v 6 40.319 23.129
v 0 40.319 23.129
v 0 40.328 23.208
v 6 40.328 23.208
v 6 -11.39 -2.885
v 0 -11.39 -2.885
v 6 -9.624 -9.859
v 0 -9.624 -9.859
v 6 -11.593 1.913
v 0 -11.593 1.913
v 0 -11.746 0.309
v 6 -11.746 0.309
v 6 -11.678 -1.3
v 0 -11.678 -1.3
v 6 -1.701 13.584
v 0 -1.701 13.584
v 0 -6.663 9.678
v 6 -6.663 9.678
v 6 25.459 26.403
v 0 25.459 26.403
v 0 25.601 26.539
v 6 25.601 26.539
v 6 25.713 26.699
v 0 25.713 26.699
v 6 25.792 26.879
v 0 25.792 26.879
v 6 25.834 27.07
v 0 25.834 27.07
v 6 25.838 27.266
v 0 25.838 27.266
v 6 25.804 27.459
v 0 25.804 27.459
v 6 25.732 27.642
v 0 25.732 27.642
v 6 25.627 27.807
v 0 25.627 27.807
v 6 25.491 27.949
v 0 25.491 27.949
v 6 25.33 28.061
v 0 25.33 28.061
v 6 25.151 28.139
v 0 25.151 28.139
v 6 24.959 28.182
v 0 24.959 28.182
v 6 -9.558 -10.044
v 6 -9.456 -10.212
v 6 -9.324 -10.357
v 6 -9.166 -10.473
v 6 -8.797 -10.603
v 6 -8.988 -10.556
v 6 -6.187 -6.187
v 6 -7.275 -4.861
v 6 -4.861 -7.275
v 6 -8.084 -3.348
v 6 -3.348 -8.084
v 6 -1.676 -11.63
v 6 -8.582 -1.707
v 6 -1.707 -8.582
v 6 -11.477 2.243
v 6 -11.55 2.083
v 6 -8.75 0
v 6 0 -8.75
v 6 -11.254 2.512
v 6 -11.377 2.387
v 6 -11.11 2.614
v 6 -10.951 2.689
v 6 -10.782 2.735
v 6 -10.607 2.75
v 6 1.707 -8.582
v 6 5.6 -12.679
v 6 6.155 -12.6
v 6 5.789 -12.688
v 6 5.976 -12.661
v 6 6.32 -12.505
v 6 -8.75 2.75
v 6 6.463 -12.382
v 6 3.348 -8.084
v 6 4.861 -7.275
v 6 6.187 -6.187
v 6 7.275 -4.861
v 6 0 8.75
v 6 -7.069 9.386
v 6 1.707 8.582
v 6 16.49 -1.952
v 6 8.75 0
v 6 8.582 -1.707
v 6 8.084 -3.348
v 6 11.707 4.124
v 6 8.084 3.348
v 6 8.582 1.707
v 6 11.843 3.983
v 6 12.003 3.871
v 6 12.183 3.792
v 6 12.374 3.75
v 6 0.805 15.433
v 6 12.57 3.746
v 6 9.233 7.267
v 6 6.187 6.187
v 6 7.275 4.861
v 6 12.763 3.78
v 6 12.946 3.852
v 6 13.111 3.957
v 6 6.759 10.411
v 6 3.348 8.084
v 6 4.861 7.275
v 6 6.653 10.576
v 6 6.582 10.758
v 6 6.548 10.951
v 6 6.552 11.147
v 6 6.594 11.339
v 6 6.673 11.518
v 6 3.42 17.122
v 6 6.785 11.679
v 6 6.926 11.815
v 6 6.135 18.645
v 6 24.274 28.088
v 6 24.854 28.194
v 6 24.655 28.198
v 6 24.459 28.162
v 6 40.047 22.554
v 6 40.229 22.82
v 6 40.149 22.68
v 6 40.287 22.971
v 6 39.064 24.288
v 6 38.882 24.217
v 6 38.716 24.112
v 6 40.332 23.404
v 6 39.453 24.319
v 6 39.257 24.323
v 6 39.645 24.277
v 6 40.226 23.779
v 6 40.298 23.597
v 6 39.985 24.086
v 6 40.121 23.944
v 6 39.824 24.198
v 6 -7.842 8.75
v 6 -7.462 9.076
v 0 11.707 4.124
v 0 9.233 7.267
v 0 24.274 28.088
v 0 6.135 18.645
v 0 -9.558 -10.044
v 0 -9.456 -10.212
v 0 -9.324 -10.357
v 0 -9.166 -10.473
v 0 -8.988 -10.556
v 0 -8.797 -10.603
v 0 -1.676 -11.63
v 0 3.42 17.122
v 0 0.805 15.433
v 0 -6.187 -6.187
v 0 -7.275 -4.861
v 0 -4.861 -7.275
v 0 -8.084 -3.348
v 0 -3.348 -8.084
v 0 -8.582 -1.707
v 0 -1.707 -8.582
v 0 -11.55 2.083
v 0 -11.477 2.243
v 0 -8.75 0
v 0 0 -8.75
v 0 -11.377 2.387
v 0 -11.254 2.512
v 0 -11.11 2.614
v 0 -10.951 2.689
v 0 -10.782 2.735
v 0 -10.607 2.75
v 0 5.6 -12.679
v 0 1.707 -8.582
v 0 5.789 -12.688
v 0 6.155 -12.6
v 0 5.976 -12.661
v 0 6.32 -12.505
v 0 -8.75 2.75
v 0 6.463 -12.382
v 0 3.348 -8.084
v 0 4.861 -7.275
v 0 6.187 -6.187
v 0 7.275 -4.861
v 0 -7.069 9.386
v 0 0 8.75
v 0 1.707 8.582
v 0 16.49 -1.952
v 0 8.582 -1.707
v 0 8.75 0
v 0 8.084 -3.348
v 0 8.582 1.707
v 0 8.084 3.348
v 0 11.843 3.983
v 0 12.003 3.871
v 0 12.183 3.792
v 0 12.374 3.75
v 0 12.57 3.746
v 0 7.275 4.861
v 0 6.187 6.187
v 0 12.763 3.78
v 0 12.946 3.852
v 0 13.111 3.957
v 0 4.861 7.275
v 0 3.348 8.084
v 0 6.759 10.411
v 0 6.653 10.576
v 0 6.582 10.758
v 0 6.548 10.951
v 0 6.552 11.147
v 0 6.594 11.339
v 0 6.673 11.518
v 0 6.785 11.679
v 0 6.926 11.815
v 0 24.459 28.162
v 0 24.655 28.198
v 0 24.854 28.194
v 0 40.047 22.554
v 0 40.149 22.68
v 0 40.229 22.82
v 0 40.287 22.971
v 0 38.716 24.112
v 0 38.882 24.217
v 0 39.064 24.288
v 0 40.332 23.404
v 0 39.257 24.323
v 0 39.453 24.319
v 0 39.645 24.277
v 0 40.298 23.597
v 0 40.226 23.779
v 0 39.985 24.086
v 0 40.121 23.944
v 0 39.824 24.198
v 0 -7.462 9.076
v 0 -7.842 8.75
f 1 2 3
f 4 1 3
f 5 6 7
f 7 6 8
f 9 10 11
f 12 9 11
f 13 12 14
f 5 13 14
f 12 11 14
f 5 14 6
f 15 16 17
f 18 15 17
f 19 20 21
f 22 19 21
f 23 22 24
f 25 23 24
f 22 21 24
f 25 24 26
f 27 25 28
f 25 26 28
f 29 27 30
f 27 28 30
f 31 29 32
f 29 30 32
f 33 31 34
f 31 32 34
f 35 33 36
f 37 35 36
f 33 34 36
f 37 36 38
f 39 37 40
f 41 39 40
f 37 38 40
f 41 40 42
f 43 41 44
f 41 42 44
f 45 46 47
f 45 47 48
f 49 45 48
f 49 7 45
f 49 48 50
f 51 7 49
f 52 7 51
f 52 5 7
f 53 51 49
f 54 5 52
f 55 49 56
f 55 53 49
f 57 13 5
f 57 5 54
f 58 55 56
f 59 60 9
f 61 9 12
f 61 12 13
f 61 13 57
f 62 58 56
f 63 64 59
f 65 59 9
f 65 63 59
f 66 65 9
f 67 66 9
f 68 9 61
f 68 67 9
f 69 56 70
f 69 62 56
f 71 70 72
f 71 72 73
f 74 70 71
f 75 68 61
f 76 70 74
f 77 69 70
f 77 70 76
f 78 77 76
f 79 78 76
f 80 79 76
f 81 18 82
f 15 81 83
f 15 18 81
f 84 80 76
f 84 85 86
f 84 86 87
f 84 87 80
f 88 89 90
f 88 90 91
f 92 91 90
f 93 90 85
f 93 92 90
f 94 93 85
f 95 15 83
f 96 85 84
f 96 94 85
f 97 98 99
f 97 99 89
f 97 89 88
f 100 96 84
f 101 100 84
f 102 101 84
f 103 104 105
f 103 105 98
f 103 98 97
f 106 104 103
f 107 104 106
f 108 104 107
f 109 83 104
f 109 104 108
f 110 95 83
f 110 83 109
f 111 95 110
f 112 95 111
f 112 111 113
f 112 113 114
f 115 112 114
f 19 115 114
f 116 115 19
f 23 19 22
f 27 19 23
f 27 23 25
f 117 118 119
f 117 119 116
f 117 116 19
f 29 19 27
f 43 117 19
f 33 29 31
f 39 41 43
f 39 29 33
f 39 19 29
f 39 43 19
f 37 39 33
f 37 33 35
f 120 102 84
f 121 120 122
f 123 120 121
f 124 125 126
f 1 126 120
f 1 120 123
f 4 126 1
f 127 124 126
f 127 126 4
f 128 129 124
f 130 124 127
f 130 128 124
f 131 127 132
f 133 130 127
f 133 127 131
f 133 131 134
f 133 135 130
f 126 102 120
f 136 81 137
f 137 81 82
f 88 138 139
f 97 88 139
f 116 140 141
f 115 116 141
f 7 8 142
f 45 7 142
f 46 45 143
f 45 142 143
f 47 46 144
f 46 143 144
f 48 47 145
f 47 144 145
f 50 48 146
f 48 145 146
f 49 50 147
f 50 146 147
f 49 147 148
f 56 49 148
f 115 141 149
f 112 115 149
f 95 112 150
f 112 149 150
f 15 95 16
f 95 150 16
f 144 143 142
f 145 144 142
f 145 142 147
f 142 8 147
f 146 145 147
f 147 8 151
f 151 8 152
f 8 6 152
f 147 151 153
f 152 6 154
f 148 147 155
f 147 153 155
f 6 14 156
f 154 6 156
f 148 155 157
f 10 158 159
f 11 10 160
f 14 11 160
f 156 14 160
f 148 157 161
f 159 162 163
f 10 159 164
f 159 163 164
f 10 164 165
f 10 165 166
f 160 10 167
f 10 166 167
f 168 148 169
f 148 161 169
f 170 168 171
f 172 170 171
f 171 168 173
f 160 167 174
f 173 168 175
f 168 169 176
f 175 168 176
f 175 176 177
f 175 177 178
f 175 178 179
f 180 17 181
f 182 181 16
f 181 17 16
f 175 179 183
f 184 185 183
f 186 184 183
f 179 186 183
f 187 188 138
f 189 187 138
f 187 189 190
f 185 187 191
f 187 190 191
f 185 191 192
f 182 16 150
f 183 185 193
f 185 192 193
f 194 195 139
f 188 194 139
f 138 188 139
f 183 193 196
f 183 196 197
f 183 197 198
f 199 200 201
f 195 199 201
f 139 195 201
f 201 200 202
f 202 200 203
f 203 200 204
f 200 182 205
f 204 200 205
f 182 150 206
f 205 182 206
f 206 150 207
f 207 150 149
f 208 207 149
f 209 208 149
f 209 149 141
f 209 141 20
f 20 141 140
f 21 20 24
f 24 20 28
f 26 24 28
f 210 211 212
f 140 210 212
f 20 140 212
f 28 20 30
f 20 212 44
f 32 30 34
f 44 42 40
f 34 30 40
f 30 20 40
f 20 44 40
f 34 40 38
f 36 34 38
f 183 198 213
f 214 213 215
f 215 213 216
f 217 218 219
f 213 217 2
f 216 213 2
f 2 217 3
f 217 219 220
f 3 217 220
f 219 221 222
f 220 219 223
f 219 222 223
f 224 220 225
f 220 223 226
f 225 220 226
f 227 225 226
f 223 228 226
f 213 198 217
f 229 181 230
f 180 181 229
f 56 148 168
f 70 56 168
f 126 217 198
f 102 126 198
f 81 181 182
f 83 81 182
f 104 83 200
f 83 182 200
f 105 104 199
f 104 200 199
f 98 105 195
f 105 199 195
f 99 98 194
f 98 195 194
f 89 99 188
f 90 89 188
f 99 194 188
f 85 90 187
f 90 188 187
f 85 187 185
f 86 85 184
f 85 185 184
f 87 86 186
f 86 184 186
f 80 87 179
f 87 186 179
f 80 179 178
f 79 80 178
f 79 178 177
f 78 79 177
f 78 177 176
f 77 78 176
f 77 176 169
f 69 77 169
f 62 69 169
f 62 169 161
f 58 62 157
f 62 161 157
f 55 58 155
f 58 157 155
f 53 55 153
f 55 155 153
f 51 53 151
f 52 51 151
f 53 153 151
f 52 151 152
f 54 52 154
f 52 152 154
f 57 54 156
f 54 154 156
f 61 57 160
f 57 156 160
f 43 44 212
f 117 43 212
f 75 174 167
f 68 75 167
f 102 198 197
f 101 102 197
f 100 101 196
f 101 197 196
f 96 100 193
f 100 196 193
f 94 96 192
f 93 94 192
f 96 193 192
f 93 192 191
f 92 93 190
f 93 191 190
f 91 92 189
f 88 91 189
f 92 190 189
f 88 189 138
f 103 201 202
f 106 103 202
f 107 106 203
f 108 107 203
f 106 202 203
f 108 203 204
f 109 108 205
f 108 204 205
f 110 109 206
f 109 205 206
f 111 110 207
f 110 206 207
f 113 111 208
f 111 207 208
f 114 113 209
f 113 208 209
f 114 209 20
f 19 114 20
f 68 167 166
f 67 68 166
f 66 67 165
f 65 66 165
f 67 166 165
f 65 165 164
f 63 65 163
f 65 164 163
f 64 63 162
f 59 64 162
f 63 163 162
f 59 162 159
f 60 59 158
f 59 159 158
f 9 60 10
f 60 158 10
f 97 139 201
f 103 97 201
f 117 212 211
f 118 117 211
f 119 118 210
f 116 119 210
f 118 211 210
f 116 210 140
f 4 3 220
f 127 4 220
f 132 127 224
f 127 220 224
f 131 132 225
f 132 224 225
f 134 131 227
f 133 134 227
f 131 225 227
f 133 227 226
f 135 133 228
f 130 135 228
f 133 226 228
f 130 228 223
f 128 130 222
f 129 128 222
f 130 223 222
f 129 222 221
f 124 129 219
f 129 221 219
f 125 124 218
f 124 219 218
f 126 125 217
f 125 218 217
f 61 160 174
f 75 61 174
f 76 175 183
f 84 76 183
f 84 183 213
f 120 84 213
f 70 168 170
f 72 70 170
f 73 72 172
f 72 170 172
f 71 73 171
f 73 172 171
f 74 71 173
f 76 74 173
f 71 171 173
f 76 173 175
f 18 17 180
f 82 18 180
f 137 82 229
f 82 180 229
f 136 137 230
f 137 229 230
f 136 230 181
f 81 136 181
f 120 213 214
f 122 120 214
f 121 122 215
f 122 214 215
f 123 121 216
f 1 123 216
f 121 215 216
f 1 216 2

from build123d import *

# Parameters (mm, degrees)
F1_DEPTH = 6


with BuildPart() as f1:
    # F0 (on Right) → F1 (new body)
    with BuildSketch(Plane.YZ):
        with BuildLine():
            ThreePointArc((0, 8.75), (6.187184, -6.187184), (-8.75, 0))
            Line((-8.75, 0), (-8.75, 2.75))
            Line((-8.75, 2.75), (-10.606602, 2.75))
            ThreePointArc((-10.606602, 2.75), (-11.253598, 2.512493), (-11.593262, 1.912791))
            ThreePointArc((-11.593262, 1.912791), (-11.739513, -0.496329), (-11.39044, -2.884507))
            Line((-11.39044, -2.884507), (-9.624207, -9.859066))
            ThreePointArc((-9.624207, -9.859066), (-9.323883, -10.35677), (-8.797476, -10.603346))
            Line((-8.797476, -10.603346), (-1.676351, -11.629804))
            Line((-1.676351, -11.629804), (5.599694, -12.678593))
            ThreePointArc((5.599694, -12.678593), (6.067344, -12.634542), (6.463292, -12.38183))
            Line((6.463292, -12.38183), (16.489511, -1.951659))
            Line((16.489511, -1.951659), (40.04656, 22.554495))
            ThreePointArc((40.04656, 22.554495), (40.229484, 22.81966), (40.318611, 23.129224))
            Line((40.318611, 23.129224), (40.327941, 23.207551))
            ThreePointArc((40.327941, 23.207551), (39.824234, 24.197961), (38.716454, 24.11161))
            Line((38.716454, 24.11161), (13.11122, 3.95707))
            ThreePointArc((13.11122, 3.95707), (12.374434, 3.749868), (11.706934, 4.124342))
            Line((11.706934, 4.124342), (9.232906, 7.267458))
            Line((9.232906, 7.267458), (6.758877, 10.410575))
            ThreePointArc((6.758877, 10.410575), (6.551676, 11.147362), (6.926149, 11.814862))
            Line((6.926149, 11.814862), (25.45937, 26.402838))
            ThreePointArc((25.45937, 26.402838), (25.803521, 27.459339), (24.959142, 28.181598))
            Line((24.959142, 28.181598), (24.854219, 28.194096))
            ThreePointArc((24.854219, 28.194096), (24.556198, 28.184829), (24.274156, 28.088108))
            Line((24.274156, 28.088108), (6.135427, 18.644765))
            ThreePointArc((6.135427, 18.644765), (2.099072, 16.297577), (-1.700732, 13.584103))
            Line((-1.700732, 13.584103), (-6.66306, 9.678126))
            Line((-6.66306, 9.678126), (-7.842194, 8.75))
            Line((-7.842194, 8.75), (0, 8.75))
        make_face()
        with BuildLine():
            ThreePointArc((-6.66306, 9.678126), (-7.267458, 9.232906), (-7.842194, 8.75))
            Line((-7.842194, 8.75), (-6.66306, 9.678126))
        make_face()
    extrude(amount=F1_DEPTH)


solid = f1.part
